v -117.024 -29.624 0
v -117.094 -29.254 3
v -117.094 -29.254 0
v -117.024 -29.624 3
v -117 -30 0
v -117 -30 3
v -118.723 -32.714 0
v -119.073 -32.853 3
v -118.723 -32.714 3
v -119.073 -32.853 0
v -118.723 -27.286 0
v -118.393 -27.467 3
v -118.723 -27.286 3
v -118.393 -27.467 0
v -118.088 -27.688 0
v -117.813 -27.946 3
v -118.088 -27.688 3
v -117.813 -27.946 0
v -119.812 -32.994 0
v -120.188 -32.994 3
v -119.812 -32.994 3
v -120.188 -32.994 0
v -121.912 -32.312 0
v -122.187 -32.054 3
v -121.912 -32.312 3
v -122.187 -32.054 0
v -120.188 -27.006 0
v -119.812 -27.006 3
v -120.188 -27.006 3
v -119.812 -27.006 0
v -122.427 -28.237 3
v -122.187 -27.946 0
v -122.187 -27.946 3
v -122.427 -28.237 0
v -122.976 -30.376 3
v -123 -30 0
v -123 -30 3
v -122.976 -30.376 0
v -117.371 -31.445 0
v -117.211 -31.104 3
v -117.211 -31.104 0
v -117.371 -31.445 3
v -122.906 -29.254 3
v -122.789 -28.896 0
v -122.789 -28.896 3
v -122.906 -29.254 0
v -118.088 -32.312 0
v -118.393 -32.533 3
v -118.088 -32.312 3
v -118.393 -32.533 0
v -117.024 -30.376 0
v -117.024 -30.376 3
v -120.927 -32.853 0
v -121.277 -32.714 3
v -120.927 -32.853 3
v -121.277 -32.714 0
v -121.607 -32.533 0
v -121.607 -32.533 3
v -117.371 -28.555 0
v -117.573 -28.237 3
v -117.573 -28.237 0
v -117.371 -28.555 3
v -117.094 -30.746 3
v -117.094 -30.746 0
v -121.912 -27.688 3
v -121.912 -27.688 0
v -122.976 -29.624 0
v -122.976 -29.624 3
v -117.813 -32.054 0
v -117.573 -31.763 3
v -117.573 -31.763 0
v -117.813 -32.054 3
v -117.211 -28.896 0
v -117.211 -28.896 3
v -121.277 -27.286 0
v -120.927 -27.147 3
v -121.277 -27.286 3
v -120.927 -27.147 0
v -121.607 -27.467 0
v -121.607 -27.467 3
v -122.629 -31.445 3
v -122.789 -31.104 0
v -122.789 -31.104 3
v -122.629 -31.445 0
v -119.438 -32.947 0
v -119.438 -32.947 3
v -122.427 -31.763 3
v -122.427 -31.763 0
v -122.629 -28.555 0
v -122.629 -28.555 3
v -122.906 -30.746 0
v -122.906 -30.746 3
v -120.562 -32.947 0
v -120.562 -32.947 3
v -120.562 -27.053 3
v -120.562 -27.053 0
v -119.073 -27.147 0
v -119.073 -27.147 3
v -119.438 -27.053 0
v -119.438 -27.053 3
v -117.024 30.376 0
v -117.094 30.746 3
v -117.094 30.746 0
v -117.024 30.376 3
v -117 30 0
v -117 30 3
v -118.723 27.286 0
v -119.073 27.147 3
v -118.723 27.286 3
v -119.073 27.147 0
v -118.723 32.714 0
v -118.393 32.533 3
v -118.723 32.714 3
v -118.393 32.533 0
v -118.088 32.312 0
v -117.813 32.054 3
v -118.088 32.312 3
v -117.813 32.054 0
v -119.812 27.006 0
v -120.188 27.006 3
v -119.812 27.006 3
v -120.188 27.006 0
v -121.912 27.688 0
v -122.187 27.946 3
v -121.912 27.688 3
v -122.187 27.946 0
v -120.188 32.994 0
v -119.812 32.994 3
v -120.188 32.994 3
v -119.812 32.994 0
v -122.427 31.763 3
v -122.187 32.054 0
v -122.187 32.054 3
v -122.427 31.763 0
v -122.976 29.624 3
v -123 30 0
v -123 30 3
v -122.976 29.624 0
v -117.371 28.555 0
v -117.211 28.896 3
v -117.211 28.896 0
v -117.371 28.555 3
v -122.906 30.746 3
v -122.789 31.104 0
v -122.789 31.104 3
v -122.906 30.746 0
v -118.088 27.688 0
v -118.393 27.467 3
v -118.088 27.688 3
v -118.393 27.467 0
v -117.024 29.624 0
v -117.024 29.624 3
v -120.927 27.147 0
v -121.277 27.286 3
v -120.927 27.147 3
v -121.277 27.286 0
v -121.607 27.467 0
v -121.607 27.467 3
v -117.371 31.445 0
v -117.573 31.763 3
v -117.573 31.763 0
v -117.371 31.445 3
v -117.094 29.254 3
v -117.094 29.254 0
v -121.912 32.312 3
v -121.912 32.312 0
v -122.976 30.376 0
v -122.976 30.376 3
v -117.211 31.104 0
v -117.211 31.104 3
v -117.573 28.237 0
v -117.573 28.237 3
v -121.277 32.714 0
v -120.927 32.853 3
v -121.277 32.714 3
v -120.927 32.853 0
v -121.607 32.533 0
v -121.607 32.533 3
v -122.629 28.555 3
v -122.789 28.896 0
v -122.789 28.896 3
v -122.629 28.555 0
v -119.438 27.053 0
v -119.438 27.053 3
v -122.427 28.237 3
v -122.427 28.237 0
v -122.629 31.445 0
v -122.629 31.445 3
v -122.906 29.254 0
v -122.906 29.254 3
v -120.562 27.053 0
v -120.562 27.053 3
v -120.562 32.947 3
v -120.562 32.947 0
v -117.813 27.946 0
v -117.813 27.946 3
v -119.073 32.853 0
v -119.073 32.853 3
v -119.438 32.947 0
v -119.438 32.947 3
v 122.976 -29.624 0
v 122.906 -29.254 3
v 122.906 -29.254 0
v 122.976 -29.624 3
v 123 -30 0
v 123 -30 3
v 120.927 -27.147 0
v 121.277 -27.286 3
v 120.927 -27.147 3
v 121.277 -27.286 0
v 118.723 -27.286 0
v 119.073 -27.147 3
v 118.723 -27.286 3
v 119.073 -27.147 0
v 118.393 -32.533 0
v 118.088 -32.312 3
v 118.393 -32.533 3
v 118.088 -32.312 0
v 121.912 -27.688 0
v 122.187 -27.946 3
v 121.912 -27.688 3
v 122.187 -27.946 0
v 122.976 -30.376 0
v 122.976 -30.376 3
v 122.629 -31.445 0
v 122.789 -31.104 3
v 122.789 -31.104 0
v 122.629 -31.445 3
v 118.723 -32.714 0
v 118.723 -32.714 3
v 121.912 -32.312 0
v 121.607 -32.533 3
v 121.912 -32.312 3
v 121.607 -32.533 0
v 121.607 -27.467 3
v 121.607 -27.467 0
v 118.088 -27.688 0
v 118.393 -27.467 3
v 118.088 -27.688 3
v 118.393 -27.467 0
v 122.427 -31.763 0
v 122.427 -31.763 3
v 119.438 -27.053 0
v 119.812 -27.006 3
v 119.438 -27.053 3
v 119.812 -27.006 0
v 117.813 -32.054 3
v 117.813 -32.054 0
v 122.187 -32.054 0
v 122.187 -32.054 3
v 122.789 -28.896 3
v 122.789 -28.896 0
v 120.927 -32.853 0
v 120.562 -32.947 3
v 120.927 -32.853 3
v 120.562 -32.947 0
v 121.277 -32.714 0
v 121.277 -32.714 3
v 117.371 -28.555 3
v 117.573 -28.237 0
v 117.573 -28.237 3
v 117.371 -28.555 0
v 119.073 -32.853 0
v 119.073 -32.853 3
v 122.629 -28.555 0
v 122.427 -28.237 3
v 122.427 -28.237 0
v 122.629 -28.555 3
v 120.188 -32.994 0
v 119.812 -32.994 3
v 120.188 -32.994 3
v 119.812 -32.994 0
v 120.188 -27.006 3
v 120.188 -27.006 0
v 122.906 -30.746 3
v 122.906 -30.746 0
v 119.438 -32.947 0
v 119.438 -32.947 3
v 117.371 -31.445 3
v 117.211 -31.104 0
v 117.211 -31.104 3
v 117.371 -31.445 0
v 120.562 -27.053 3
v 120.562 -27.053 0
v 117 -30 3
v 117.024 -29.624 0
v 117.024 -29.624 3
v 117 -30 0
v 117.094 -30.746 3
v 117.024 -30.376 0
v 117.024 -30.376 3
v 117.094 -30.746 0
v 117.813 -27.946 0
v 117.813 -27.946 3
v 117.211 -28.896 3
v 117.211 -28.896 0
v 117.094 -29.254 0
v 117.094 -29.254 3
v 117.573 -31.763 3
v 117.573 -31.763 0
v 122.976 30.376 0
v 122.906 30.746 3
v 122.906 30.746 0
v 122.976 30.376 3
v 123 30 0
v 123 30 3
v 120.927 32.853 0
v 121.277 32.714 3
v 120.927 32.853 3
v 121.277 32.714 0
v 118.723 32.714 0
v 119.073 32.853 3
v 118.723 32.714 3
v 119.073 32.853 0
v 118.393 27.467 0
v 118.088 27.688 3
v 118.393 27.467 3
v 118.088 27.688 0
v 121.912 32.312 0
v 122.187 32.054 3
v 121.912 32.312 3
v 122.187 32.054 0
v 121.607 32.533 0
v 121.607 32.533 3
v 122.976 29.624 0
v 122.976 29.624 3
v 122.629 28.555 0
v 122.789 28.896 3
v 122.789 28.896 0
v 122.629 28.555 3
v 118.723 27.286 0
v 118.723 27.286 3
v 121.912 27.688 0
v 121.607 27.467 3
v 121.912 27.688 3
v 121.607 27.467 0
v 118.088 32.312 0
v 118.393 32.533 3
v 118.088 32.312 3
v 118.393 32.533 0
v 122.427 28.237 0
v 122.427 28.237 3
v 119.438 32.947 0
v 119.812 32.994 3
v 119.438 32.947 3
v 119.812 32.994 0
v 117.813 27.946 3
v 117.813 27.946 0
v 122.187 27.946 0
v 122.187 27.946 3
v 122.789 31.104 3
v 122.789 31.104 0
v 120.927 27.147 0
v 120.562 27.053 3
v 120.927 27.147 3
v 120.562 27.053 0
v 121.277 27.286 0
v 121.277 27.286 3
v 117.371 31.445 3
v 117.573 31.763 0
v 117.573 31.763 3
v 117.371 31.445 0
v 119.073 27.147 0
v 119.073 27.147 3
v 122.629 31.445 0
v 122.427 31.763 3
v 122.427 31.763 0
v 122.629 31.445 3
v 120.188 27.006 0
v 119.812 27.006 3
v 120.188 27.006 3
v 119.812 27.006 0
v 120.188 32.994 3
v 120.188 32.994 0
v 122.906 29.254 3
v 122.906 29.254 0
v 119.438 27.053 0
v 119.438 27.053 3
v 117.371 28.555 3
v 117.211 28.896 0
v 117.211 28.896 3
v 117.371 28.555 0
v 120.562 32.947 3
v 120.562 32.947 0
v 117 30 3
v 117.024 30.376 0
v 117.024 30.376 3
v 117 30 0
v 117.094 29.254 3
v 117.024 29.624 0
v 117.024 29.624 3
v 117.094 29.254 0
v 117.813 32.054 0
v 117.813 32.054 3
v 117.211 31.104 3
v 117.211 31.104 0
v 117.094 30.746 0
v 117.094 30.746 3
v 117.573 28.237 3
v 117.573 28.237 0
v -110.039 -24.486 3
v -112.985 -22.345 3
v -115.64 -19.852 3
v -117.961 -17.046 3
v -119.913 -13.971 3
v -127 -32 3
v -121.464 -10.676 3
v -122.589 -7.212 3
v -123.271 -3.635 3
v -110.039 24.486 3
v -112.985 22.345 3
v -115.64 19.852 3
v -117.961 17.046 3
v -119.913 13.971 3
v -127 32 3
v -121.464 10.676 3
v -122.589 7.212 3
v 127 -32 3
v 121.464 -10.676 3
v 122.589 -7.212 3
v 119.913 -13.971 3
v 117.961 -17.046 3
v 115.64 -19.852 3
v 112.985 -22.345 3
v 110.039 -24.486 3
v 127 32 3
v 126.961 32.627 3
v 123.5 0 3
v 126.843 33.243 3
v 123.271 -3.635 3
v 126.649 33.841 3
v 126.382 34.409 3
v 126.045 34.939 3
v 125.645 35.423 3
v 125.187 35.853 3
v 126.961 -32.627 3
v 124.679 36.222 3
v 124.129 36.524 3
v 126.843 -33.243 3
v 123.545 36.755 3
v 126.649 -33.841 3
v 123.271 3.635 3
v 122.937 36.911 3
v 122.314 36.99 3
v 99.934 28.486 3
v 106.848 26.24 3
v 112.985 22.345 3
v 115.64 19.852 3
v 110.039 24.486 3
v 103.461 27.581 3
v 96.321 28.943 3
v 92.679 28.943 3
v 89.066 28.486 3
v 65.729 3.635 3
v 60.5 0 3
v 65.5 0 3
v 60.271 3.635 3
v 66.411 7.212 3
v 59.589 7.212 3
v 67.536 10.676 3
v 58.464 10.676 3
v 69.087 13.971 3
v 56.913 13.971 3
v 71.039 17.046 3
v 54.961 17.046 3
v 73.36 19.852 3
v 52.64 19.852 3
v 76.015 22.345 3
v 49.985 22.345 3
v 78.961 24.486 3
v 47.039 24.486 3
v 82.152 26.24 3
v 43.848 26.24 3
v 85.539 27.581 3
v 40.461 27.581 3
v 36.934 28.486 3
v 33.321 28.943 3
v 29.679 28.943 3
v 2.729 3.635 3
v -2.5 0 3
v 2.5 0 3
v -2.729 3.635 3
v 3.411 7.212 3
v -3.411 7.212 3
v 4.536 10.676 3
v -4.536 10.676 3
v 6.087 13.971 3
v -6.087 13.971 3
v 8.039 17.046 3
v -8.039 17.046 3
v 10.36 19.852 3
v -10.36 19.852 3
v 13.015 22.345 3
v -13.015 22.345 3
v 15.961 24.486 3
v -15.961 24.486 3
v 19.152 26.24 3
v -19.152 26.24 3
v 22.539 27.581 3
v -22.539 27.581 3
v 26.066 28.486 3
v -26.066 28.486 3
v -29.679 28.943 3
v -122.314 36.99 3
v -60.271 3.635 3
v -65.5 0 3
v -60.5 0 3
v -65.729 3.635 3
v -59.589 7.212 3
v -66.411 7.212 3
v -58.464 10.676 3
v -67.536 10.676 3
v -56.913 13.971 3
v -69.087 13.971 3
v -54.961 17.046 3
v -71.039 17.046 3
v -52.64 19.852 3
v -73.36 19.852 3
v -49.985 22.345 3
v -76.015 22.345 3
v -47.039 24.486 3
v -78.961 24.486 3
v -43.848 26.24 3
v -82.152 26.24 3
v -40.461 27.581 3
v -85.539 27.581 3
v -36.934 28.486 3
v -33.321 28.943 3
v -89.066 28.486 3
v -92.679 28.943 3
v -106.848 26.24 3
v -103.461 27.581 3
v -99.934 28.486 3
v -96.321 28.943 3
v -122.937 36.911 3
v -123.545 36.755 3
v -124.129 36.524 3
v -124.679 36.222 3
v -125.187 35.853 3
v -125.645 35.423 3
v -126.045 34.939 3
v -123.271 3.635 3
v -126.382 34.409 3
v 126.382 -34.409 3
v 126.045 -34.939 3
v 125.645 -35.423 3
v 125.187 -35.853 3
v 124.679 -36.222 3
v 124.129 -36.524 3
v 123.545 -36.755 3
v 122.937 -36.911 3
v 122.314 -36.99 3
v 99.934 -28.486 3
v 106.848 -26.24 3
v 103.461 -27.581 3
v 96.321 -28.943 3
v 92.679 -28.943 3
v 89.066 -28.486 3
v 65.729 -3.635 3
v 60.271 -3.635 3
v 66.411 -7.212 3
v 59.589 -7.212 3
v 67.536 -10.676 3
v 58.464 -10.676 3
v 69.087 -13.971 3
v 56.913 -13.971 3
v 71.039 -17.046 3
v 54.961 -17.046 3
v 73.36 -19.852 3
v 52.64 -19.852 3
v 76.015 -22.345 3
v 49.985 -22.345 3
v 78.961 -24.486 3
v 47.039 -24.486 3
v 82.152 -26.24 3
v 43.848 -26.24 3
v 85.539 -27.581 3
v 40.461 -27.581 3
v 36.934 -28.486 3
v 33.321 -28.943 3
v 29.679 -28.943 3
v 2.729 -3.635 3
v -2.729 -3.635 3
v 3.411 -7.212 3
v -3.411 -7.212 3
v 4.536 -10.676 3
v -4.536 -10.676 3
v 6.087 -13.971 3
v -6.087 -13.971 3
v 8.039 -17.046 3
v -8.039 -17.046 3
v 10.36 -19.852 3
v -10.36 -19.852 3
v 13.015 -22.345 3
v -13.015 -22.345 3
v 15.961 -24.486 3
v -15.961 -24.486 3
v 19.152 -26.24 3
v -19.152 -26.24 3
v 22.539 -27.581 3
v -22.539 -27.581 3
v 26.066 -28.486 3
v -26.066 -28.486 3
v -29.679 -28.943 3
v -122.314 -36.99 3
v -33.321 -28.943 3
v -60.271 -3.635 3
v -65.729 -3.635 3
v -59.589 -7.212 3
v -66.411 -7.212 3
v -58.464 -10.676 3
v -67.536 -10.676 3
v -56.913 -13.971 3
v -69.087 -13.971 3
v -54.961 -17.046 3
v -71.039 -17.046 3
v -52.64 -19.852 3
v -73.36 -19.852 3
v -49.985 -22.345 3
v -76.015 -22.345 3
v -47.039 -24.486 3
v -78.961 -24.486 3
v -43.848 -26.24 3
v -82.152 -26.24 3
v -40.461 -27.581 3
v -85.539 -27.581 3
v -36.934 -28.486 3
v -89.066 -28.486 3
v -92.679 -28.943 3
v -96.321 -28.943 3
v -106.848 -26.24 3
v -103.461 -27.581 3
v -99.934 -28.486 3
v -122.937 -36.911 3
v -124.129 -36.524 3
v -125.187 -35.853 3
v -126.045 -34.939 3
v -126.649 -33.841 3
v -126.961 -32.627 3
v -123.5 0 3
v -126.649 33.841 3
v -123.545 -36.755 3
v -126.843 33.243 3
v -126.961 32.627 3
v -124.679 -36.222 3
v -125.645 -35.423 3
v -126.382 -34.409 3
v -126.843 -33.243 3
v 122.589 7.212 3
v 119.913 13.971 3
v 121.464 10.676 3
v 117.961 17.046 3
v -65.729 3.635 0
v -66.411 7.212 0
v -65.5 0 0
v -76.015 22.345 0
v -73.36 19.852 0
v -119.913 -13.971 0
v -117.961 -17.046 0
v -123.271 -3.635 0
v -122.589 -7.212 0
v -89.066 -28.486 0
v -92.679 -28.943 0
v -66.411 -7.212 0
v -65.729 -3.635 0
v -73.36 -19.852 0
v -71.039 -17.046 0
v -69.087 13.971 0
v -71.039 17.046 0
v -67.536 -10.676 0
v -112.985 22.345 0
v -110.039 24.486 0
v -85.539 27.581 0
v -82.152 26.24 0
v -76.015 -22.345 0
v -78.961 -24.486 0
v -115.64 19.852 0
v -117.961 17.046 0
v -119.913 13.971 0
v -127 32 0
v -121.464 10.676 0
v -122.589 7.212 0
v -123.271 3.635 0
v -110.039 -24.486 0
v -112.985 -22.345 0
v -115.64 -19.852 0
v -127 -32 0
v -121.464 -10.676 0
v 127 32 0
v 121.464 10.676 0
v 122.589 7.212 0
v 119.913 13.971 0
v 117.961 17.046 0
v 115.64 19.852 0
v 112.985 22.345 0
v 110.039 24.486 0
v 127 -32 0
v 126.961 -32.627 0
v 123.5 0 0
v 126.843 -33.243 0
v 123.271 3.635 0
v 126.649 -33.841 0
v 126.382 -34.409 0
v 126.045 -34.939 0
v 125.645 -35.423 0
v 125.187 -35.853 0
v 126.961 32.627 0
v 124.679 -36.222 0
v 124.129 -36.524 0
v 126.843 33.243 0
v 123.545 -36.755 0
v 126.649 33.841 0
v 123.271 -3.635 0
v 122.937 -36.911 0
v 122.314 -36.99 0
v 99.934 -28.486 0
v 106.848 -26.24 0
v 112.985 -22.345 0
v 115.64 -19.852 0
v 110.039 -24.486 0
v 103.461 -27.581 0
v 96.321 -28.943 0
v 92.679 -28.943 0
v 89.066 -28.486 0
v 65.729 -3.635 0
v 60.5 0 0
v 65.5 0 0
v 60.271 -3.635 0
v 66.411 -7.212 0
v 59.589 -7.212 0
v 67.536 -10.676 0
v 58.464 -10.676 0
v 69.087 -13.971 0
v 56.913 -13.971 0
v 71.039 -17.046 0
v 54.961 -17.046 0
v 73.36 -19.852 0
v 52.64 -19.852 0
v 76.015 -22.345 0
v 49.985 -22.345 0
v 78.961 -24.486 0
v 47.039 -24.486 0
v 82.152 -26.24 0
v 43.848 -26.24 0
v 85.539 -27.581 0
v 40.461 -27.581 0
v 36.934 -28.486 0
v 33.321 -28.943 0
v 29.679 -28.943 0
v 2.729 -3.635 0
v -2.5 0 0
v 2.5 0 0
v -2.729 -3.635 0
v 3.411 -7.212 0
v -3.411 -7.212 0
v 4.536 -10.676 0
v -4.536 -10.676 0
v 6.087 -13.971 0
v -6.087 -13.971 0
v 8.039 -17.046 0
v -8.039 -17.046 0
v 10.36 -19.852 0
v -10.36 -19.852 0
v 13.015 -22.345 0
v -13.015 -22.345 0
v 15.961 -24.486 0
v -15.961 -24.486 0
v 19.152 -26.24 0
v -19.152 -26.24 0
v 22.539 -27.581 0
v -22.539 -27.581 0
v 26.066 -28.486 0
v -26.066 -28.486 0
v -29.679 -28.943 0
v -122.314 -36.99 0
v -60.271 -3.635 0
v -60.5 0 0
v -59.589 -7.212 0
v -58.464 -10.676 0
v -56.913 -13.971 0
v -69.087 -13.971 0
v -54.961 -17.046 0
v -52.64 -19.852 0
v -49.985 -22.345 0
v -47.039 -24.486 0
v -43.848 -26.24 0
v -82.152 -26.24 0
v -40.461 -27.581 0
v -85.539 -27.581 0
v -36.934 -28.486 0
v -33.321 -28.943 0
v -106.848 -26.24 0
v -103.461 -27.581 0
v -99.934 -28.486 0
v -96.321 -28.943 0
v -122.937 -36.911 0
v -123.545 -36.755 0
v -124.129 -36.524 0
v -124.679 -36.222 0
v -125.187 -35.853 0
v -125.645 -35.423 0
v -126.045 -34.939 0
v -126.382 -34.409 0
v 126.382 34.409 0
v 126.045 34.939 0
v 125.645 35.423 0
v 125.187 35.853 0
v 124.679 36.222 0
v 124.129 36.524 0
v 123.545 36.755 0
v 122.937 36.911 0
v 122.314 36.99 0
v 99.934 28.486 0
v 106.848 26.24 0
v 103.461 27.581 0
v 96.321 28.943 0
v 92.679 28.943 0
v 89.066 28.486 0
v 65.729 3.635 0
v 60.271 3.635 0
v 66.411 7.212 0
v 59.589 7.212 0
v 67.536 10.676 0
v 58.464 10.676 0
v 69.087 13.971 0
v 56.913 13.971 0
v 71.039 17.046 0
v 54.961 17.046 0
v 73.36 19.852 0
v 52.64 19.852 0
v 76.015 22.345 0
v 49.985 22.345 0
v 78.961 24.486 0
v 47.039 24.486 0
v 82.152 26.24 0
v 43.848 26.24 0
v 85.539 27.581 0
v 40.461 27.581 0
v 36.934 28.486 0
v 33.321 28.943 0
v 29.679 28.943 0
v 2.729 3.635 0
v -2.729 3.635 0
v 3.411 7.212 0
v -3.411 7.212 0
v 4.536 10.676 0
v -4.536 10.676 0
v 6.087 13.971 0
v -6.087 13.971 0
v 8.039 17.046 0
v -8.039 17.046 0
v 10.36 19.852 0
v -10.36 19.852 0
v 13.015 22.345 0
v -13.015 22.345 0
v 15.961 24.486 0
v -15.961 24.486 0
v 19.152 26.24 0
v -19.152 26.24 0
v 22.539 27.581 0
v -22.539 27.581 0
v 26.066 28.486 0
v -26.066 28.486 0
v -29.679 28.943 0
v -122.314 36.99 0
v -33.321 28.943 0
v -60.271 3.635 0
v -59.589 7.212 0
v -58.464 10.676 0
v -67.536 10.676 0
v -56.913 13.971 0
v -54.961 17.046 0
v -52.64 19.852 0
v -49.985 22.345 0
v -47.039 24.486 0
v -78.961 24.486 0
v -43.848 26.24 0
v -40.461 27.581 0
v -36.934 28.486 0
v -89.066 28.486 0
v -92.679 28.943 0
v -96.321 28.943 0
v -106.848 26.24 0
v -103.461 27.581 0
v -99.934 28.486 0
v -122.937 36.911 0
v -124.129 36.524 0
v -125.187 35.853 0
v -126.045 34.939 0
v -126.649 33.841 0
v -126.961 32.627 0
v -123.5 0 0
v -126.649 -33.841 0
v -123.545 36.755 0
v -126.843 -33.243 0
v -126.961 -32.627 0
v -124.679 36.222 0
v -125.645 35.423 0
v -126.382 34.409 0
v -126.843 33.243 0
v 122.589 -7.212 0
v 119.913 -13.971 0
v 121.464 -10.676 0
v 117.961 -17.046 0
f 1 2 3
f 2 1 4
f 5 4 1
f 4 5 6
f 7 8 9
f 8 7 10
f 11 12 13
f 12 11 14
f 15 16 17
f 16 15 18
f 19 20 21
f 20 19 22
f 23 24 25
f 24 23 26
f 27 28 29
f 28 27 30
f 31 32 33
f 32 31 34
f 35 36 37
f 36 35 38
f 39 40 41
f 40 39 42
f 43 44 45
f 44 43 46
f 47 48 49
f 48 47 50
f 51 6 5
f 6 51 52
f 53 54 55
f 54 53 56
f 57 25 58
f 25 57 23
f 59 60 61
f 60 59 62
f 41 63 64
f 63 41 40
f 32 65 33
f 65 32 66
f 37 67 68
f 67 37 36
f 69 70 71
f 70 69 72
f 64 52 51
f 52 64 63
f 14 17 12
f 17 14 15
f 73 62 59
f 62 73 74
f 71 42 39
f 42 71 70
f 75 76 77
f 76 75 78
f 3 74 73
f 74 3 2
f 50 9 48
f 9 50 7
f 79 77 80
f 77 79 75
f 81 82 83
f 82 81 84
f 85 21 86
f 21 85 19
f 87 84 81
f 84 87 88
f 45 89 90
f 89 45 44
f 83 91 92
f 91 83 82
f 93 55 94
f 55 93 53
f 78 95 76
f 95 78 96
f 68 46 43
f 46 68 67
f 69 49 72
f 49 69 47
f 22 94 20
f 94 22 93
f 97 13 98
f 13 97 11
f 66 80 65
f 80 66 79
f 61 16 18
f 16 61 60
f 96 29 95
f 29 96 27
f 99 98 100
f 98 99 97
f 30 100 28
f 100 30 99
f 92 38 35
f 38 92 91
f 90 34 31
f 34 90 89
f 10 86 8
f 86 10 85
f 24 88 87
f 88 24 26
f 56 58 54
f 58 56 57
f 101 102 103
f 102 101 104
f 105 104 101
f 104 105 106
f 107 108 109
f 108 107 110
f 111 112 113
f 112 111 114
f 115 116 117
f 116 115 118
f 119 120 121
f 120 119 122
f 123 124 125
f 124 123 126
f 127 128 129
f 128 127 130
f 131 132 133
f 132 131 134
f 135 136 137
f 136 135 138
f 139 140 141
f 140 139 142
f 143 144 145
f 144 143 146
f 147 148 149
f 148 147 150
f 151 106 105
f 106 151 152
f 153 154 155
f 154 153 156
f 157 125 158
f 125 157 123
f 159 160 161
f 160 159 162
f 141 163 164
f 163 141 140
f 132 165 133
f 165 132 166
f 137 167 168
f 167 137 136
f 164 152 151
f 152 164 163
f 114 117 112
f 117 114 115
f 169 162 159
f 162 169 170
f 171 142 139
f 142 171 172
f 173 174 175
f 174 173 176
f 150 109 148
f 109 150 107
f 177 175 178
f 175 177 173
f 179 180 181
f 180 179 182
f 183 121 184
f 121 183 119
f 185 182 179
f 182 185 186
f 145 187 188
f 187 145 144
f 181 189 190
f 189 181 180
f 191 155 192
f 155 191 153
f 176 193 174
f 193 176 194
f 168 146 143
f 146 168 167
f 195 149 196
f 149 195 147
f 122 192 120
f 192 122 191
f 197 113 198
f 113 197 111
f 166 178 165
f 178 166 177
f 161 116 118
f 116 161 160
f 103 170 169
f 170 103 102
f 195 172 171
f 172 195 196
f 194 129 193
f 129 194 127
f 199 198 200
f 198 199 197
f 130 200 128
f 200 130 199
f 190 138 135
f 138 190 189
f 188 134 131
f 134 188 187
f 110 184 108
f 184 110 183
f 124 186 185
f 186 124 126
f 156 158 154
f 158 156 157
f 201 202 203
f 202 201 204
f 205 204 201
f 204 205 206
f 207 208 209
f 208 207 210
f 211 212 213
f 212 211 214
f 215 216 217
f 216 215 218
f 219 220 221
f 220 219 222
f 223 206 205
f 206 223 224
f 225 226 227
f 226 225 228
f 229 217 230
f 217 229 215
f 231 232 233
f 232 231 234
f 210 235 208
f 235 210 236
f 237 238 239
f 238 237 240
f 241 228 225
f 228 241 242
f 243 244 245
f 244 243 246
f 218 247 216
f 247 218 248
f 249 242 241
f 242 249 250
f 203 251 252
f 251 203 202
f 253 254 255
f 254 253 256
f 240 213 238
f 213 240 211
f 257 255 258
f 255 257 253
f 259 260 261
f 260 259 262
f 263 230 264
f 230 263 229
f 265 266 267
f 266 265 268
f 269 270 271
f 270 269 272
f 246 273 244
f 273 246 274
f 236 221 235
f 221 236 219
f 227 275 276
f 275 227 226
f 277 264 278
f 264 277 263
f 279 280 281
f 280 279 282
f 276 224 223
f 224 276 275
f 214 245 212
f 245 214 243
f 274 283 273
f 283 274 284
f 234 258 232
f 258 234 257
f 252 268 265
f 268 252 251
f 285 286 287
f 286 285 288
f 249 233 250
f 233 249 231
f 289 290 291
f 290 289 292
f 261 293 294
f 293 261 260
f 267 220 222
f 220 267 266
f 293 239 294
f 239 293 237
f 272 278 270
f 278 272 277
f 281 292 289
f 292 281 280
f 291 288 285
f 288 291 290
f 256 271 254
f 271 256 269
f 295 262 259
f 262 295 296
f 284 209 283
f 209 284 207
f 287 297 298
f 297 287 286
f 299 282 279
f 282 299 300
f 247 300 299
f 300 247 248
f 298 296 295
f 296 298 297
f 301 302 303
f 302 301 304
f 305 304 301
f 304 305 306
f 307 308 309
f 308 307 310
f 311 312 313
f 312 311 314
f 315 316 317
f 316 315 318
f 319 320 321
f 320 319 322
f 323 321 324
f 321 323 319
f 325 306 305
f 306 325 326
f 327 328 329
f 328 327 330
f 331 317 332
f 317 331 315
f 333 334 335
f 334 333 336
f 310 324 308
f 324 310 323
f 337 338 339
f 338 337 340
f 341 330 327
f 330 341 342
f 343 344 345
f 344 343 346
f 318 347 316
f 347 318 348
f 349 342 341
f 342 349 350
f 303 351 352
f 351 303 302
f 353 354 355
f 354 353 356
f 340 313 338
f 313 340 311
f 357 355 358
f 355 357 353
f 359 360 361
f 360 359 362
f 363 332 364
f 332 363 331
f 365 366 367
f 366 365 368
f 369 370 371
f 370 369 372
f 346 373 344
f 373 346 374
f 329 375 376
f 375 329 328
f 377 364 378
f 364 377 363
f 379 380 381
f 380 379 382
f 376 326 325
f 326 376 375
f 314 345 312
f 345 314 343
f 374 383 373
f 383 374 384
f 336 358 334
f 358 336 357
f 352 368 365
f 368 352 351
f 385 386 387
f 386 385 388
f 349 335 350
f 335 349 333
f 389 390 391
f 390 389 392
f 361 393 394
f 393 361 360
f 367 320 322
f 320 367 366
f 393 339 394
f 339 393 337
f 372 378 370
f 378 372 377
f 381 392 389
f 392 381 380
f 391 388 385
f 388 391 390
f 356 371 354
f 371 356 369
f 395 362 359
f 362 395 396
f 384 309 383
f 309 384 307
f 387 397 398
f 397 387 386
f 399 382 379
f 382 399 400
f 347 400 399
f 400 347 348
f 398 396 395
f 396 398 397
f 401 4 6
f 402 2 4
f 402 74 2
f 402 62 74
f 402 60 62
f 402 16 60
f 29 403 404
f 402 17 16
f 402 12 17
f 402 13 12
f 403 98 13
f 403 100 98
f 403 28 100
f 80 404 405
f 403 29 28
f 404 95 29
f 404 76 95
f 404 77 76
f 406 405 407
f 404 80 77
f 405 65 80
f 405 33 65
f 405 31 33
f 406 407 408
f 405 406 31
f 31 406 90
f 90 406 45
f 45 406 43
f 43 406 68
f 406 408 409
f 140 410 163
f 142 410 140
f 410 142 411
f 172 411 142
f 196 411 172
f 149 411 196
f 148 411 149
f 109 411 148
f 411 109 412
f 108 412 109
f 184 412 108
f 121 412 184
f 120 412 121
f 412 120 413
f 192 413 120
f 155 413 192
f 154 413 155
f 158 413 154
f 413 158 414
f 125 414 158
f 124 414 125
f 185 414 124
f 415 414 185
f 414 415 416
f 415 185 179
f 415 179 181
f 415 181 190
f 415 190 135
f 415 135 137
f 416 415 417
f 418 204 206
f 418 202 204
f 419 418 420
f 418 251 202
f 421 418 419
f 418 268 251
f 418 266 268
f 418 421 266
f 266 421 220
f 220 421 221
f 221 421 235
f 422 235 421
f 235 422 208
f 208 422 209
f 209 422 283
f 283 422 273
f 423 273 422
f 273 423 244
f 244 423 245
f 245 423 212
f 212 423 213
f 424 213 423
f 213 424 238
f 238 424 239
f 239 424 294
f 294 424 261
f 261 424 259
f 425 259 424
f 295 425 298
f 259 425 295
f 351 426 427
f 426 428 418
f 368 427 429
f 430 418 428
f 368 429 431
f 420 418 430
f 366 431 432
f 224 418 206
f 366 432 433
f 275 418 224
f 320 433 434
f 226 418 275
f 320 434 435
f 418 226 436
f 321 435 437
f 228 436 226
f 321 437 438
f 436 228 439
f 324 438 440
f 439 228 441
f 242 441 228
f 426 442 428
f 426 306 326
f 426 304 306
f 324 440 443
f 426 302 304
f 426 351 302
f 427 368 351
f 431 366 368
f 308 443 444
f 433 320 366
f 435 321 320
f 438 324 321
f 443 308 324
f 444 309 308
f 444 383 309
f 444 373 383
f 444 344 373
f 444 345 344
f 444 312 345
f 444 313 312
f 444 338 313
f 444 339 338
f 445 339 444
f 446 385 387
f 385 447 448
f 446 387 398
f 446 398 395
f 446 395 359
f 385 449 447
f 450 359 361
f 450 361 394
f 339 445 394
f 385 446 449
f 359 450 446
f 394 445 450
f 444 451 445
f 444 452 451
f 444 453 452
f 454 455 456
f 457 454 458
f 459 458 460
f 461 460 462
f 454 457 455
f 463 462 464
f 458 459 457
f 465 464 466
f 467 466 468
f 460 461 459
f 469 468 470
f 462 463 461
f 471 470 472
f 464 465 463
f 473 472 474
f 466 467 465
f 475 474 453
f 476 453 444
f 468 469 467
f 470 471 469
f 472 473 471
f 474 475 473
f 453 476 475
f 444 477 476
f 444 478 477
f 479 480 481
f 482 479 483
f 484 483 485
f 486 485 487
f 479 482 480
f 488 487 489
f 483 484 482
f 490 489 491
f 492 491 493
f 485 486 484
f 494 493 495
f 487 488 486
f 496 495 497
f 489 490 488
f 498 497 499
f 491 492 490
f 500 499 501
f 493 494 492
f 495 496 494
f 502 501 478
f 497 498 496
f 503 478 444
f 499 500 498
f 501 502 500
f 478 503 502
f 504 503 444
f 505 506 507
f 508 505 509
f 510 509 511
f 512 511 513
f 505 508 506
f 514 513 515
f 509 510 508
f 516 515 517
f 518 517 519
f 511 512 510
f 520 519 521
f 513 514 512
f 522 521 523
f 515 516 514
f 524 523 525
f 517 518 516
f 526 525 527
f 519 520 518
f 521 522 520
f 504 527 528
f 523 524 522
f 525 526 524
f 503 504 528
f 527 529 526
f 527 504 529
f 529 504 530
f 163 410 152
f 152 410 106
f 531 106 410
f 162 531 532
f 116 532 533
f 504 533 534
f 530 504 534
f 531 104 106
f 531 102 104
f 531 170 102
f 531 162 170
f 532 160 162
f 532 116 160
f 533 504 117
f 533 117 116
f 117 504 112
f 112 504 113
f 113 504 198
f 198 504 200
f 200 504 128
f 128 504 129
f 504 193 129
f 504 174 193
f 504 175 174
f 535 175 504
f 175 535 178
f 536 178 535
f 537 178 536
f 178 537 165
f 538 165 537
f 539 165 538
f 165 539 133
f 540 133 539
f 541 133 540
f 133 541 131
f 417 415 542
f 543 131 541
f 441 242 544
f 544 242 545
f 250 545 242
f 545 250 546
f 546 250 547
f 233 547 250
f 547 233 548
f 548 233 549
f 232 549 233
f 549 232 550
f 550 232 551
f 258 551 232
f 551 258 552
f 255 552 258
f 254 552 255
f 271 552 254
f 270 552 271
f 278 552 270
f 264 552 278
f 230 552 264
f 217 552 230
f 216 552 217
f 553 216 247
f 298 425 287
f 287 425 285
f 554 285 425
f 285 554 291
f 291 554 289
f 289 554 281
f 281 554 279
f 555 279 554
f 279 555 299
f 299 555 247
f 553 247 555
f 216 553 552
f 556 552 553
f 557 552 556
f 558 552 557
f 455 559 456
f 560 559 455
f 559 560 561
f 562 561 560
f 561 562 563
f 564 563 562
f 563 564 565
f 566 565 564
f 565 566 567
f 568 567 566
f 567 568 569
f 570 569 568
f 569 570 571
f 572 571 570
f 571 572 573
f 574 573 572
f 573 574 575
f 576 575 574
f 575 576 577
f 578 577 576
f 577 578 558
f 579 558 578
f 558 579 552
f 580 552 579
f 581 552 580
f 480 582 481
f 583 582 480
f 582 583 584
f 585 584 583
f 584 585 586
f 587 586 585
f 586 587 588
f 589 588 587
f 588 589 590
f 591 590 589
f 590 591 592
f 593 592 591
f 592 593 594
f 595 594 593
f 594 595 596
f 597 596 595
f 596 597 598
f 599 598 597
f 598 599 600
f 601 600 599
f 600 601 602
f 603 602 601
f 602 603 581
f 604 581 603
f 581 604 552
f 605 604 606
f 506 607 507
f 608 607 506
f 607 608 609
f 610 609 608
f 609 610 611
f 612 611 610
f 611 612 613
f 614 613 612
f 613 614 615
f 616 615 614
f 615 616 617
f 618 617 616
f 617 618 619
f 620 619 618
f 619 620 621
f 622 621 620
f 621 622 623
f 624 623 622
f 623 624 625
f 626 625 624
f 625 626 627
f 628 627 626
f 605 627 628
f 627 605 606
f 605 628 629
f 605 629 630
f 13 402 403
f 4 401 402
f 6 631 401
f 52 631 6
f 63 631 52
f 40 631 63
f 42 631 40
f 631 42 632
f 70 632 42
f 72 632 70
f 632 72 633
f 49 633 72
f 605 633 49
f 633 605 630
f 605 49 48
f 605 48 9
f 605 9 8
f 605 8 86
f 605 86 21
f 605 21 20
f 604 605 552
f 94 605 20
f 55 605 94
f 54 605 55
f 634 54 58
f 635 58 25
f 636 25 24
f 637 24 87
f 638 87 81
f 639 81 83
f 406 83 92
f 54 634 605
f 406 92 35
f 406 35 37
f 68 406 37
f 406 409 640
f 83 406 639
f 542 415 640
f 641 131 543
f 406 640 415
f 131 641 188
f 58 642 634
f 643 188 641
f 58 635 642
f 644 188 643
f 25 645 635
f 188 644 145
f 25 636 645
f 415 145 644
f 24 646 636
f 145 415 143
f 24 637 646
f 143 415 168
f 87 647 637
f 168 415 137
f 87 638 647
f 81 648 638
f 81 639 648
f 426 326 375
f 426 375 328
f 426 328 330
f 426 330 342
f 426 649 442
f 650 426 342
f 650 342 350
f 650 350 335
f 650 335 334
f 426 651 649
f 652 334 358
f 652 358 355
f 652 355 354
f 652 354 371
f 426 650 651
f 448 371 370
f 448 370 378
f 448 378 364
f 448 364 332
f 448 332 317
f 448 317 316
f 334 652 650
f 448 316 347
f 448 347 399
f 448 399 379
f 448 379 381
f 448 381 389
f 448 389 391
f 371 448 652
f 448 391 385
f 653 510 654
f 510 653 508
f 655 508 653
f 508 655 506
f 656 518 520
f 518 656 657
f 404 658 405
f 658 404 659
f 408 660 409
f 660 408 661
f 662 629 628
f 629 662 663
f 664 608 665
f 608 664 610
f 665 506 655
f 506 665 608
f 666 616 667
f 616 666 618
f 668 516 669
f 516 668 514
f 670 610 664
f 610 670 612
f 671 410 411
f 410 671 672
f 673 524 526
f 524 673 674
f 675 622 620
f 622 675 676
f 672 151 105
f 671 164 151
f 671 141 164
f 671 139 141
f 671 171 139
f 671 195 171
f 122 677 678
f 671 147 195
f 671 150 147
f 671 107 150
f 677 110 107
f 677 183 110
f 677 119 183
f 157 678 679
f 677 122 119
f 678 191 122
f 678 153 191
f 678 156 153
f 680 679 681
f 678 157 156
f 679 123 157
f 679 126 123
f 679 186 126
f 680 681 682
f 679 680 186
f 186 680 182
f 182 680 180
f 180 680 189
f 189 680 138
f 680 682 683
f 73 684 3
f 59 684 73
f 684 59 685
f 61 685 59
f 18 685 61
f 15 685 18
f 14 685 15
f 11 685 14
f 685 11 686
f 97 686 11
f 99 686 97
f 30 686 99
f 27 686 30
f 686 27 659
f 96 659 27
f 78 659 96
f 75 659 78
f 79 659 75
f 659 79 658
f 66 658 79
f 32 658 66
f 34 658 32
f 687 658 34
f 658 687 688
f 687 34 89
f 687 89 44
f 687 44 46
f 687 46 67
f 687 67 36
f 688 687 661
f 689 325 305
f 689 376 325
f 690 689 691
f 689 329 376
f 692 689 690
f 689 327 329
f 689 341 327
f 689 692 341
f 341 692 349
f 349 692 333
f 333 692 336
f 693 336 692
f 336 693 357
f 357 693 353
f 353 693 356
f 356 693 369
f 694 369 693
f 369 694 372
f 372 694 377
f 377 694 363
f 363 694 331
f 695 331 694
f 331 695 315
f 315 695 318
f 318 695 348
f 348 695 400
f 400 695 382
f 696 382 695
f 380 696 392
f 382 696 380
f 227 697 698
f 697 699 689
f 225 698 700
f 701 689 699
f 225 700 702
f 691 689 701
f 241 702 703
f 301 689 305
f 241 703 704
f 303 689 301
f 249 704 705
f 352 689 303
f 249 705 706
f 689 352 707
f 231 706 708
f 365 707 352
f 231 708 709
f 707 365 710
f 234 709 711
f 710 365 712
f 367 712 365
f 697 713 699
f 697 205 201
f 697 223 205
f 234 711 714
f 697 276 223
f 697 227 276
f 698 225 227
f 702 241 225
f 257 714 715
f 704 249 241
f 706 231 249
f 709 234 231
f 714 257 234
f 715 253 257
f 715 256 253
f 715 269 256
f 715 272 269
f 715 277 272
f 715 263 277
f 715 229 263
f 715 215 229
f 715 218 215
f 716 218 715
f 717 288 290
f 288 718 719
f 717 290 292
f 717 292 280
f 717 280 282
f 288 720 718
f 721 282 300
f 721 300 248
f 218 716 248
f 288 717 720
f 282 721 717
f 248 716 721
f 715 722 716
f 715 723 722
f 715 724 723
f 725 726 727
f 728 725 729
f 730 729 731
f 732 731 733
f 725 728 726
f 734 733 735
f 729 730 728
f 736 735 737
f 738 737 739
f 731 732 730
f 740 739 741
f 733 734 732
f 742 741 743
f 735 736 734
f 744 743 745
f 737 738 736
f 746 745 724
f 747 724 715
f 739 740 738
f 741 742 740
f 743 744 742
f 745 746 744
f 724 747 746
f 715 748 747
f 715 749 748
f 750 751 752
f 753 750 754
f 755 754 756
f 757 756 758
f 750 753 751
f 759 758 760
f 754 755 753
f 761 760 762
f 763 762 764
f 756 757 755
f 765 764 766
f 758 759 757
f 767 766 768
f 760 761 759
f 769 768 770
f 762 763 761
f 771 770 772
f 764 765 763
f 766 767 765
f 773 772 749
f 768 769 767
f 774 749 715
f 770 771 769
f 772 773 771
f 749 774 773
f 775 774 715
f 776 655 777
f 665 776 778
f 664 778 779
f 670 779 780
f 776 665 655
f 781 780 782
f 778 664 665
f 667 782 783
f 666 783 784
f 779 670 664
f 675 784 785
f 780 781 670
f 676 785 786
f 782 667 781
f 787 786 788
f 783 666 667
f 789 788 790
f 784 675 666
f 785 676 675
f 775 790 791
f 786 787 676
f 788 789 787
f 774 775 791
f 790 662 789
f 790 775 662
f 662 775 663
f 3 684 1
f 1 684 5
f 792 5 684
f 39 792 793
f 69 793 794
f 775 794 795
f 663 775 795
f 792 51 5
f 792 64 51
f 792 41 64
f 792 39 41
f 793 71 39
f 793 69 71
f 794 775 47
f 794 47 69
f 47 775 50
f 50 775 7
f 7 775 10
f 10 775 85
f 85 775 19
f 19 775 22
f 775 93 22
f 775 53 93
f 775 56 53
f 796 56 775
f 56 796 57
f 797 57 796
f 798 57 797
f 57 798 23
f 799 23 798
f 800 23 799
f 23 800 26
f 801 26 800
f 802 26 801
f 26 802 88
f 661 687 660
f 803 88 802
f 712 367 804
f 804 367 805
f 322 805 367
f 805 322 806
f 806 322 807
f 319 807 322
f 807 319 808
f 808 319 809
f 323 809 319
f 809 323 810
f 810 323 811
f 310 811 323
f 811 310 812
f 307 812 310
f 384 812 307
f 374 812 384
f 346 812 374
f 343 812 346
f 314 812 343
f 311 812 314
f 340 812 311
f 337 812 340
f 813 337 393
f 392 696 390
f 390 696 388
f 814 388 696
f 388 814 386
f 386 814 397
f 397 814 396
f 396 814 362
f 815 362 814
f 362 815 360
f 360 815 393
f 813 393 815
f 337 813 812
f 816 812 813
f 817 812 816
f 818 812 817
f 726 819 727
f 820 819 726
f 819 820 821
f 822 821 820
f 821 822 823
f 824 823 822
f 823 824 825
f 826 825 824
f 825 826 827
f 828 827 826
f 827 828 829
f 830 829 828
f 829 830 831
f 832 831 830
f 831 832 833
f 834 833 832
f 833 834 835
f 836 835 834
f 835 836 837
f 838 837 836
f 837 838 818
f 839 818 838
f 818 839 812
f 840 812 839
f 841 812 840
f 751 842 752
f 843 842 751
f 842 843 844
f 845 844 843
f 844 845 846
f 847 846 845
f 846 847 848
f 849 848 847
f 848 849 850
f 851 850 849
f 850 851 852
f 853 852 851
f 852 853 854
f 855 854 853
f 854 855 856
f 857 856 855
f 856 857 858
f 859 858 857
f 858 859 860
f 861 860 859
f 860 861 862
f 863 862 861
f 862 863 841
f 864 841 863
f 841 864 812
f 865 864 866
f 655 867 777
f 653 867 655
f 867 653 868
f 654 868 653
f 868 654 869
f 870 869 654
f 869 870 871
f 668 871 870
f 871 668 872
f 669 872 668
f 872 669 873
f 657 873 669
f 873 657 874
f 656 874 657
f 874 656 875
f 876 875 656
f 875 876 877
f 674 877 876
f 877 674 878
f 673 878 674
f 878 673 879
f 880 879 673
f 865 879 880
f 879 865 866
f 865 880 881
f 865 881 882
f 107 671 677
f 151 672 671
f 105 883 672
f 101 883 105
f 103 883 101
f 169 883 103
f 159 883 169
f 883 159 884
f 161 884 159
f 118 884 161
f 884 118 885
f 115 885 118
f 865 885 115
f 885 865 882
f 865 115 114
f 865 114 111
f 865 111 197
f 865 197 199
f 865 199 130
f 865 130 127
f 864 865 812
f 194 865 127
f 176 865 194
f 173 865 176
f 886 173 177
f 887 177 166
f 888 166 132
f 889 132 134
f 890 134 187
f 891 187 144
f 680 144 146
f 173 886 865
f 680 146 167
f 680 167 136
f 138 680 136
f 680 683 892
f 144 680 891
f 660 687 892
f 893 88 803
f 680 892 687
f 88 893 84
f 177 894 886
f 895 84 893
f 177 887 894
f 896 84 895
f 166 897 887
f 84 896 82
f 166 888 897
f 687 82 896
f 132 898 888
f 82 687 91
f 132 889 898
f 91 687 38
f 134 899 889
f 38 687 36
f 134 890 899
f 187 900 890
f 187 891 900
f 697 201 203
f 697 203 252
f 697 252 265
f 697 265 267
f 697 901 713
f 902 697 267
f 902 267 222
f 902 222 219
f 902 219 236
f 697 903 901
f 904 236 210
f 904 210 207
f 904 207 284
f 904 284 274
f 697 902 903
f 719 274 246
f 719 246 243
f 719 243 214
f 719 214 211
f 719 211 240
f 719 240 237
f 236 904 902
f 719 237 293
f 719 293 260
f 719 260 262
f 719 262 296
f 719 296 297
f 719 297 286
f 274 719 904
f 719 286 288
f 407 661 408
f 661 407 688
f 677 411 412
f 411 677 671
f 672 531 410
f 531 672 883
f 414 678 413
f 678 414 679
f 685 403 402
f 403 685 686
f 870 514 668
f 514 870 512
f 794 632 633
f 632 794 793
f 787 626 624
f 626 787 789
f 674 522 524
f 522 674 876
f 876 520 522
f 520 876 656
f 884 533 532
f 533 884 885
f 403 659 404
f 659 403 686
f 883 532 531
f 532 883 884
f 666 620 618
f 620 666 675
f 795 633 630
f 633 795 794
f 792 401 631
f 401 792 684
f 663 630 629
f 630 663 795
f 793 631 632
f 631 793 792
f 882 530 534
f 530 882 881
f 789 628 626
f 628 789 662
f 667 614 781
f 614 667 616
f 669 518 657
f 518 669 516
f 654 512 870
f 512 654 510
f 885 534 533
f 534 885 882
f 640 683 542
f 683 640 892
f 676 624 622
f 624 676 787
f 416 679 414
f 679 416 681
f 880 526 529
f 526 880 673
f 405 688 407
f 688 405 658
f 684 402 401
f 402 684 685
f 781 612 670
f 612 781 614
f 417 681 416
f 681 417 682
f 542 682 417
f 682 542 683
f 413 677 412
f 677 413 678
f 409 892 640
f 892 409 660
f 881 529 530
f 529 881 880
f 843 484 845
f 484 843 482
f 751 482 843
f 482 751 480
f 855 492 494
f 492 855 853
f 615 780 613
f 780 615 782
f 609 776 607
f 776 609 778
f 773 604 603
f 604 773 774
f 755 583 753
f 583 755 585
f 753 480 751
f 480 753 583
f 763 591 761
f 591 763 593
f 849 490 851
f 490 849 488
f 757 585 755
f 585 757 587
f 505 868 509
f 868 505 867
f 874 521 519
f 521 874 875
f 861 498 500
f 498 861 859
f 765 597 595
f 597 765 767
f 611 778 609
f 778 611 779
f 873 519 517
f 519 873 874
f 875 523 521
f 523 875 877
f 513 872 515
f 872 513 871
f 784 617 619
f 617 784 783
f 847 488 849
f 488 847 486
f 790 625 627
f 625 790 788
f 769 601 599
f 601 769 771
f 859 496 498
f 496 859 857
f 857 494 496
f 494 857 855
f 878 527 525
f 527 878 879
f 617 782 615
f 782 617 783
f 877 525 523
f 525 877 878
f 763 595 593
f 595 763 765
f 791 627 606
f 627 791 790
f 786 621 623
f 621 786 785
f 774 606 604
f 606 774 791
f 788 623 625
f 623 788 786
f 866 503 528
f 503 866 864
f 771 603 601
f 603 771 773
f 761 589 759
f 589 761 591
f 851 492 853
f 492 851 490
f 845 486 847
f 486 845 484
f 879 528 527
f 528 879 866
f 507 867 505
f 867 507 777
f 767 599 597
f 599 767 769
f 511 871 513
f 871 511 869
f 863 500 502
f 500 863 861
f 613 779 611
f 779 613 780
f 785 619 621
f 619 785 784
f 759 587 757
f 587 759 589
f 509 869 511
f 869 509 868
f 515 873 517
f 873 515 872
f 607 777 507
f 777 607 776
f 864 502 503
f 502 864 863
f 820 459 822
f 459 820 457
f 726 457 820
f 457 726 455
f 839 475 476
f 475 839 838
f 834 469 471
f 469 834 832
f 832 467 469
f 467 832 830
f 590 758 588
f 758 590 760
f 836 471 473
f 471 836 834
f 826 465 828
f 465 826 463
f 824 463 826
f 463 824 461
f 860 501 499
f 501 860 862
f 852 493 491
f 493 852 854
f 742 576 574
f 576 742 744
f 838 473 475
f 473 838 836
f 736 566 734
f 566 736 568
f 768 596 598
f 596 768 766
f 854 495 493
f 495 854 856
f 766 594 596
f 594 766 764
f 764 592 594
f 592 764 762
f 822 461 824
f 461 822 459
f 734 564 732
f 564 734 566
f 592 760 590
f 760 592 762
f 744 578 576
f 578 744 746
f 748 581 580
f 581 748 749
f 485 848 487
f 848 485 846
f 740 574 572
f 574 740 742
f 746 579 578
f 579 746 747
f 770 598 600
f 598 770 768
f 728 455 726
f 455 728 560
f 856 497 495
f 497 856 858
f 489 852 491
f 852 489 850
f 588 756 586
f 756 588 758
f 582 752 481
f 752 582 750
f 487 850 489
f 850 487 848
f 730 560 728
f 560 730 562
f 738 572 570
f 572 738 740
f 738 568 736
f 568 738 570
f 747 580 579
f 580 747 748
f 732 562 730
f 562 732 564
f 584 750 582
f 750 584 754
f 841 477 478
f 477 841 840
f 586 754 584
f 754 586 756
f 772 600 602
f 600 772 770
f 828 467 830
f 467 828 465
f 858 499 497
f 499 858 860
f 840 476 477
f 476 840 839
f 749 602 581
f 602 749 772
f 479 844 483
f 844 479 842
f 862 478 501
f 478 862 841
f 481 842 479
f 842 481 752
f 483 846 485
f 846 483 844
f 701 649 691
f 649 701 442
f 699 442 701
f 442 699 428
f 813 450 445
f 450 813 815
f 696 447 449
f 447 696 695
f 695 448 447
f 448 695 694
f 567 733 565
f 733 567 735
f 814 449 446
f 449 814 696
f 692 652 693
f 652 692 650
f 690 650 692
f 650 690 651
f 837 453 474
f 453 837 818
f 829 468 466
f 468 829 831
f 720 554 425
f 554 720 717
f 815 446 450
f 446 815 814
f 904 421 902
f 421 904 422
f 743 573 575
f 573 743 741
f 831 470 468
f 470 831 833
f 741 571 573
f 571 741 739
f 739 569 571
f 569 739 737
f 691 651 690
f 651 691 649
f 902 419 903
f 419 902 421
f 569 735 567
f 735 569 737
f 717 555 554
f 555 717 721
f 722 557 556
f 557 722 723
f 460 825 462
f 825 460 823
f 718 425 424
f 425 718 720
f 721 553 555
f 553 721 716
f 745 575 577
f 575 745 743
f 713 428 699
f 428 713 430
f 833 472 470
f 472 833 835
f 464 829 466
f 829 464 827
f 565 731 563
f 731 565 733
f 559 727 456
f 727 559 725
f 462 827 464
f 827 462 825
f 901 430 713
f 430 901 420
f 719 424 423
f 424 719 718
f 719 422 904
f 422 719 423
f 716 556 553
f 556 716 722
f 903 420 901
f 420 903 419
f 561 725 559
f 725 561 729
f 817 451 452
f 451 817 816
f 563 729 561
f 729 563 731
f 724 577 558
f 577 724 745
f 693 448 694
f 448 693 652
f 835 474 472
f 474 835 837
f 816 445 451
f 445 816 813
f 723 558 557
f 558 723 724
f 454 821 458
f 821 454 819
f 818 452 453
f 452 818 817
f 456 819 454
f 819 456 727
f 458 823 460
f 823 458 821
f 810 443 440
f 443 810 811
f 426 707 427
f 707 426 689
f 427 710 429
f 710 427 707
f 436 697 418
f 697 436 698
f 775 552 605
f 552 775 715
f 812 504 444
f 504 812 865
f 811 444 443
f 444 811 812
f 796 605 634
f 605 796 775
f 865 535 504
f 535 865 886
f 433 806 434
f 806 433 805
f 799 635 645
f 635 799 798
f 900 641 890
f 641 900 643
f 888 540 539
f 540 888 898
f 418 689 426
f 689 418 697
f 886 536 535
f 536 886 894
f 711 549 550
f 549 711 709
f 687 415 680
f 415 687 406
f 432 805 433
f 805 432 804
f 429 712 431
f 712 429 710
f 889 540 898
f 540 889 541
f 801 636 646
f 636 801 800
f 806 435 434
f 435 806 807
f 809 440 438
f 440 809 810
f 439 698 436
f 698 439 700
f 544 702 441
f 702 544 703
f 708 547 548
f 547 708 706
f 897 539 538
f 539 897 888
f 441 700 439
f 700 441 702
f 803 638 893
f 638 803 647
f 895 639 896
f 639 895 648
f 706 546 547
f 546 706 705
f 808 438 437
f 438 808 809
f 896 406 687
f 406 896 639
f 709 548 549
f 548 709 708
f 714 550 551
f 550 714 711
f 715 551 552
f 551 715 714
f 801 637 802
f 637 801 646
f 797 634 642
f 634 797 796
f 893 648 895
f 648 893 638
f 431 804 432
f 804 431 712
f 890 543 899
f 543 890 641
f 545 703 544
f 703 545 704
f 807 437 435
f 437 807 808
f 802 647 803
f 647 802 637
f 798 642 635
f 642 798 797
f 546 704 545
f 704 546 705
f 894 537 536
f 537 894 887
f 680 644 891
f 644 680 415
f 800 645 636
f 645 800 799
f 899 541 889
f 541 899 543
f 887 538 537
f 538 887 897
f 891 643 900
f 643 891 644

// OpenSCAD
$fn = 50;


difference() {
	union() {
		hull() {
			translate(v = [-122.0000000000, 32.0000000000, 0]) {
				cylinder(h = 3, r = 5);
			}
			translate(v = [122.0000000000, 32.0000000000, 0]) {
				cylinder(h = 3, r = 5);
			}
			translate(v = [-122.0000000000, -32.0000000000, 0]) {
				cylinder(h = 3, r = 5);
			}
			translate(v = [122.0000000000, -32.0000000000, 0]) {
				cylinder(h = 3, r = 5);
			}
		}
	}
	union() {
		#translate(v = [-120.0000000000, -30.0000000000, -100.0000000000]) {
			cylinder(h = 200, r = 3.0000000000);
		}
		#translate(v = [-120.0000000000, 30.0000000000, -100.0000000000]) {
			cylinder(h = 200, r = 3.0000000000);
		}
		#translate(v = [120.0000000000, -30.0000000000, -100.0000000000]) {
			cylinder(h = 200, r = 3.0000000000);
		}
		#translate(v = [120.0000000000, 30.0000000000, -100.0000000000]) {
			cylinder(h = 200, r = 3.0000000000);
		}
		#translate(v = [-94.5000000000, 0, 0]) {
			cylinder(h = 3, r = 29.0000000000);
		}
		#translate(v = [-31.5000000000, 0, 0]) {
			cylinder(h = 3, r = 29.0000000000);
		}
		#translate(v = [31.5000000000, 0, 0]) {
			cylinder(h = 3, r = 29.0000000000);
		}
		#translate(v = [94.5000000000, 0, 0]) {
			cylinder(h = 3, r = 29.0000000000);
		}
	}
}
